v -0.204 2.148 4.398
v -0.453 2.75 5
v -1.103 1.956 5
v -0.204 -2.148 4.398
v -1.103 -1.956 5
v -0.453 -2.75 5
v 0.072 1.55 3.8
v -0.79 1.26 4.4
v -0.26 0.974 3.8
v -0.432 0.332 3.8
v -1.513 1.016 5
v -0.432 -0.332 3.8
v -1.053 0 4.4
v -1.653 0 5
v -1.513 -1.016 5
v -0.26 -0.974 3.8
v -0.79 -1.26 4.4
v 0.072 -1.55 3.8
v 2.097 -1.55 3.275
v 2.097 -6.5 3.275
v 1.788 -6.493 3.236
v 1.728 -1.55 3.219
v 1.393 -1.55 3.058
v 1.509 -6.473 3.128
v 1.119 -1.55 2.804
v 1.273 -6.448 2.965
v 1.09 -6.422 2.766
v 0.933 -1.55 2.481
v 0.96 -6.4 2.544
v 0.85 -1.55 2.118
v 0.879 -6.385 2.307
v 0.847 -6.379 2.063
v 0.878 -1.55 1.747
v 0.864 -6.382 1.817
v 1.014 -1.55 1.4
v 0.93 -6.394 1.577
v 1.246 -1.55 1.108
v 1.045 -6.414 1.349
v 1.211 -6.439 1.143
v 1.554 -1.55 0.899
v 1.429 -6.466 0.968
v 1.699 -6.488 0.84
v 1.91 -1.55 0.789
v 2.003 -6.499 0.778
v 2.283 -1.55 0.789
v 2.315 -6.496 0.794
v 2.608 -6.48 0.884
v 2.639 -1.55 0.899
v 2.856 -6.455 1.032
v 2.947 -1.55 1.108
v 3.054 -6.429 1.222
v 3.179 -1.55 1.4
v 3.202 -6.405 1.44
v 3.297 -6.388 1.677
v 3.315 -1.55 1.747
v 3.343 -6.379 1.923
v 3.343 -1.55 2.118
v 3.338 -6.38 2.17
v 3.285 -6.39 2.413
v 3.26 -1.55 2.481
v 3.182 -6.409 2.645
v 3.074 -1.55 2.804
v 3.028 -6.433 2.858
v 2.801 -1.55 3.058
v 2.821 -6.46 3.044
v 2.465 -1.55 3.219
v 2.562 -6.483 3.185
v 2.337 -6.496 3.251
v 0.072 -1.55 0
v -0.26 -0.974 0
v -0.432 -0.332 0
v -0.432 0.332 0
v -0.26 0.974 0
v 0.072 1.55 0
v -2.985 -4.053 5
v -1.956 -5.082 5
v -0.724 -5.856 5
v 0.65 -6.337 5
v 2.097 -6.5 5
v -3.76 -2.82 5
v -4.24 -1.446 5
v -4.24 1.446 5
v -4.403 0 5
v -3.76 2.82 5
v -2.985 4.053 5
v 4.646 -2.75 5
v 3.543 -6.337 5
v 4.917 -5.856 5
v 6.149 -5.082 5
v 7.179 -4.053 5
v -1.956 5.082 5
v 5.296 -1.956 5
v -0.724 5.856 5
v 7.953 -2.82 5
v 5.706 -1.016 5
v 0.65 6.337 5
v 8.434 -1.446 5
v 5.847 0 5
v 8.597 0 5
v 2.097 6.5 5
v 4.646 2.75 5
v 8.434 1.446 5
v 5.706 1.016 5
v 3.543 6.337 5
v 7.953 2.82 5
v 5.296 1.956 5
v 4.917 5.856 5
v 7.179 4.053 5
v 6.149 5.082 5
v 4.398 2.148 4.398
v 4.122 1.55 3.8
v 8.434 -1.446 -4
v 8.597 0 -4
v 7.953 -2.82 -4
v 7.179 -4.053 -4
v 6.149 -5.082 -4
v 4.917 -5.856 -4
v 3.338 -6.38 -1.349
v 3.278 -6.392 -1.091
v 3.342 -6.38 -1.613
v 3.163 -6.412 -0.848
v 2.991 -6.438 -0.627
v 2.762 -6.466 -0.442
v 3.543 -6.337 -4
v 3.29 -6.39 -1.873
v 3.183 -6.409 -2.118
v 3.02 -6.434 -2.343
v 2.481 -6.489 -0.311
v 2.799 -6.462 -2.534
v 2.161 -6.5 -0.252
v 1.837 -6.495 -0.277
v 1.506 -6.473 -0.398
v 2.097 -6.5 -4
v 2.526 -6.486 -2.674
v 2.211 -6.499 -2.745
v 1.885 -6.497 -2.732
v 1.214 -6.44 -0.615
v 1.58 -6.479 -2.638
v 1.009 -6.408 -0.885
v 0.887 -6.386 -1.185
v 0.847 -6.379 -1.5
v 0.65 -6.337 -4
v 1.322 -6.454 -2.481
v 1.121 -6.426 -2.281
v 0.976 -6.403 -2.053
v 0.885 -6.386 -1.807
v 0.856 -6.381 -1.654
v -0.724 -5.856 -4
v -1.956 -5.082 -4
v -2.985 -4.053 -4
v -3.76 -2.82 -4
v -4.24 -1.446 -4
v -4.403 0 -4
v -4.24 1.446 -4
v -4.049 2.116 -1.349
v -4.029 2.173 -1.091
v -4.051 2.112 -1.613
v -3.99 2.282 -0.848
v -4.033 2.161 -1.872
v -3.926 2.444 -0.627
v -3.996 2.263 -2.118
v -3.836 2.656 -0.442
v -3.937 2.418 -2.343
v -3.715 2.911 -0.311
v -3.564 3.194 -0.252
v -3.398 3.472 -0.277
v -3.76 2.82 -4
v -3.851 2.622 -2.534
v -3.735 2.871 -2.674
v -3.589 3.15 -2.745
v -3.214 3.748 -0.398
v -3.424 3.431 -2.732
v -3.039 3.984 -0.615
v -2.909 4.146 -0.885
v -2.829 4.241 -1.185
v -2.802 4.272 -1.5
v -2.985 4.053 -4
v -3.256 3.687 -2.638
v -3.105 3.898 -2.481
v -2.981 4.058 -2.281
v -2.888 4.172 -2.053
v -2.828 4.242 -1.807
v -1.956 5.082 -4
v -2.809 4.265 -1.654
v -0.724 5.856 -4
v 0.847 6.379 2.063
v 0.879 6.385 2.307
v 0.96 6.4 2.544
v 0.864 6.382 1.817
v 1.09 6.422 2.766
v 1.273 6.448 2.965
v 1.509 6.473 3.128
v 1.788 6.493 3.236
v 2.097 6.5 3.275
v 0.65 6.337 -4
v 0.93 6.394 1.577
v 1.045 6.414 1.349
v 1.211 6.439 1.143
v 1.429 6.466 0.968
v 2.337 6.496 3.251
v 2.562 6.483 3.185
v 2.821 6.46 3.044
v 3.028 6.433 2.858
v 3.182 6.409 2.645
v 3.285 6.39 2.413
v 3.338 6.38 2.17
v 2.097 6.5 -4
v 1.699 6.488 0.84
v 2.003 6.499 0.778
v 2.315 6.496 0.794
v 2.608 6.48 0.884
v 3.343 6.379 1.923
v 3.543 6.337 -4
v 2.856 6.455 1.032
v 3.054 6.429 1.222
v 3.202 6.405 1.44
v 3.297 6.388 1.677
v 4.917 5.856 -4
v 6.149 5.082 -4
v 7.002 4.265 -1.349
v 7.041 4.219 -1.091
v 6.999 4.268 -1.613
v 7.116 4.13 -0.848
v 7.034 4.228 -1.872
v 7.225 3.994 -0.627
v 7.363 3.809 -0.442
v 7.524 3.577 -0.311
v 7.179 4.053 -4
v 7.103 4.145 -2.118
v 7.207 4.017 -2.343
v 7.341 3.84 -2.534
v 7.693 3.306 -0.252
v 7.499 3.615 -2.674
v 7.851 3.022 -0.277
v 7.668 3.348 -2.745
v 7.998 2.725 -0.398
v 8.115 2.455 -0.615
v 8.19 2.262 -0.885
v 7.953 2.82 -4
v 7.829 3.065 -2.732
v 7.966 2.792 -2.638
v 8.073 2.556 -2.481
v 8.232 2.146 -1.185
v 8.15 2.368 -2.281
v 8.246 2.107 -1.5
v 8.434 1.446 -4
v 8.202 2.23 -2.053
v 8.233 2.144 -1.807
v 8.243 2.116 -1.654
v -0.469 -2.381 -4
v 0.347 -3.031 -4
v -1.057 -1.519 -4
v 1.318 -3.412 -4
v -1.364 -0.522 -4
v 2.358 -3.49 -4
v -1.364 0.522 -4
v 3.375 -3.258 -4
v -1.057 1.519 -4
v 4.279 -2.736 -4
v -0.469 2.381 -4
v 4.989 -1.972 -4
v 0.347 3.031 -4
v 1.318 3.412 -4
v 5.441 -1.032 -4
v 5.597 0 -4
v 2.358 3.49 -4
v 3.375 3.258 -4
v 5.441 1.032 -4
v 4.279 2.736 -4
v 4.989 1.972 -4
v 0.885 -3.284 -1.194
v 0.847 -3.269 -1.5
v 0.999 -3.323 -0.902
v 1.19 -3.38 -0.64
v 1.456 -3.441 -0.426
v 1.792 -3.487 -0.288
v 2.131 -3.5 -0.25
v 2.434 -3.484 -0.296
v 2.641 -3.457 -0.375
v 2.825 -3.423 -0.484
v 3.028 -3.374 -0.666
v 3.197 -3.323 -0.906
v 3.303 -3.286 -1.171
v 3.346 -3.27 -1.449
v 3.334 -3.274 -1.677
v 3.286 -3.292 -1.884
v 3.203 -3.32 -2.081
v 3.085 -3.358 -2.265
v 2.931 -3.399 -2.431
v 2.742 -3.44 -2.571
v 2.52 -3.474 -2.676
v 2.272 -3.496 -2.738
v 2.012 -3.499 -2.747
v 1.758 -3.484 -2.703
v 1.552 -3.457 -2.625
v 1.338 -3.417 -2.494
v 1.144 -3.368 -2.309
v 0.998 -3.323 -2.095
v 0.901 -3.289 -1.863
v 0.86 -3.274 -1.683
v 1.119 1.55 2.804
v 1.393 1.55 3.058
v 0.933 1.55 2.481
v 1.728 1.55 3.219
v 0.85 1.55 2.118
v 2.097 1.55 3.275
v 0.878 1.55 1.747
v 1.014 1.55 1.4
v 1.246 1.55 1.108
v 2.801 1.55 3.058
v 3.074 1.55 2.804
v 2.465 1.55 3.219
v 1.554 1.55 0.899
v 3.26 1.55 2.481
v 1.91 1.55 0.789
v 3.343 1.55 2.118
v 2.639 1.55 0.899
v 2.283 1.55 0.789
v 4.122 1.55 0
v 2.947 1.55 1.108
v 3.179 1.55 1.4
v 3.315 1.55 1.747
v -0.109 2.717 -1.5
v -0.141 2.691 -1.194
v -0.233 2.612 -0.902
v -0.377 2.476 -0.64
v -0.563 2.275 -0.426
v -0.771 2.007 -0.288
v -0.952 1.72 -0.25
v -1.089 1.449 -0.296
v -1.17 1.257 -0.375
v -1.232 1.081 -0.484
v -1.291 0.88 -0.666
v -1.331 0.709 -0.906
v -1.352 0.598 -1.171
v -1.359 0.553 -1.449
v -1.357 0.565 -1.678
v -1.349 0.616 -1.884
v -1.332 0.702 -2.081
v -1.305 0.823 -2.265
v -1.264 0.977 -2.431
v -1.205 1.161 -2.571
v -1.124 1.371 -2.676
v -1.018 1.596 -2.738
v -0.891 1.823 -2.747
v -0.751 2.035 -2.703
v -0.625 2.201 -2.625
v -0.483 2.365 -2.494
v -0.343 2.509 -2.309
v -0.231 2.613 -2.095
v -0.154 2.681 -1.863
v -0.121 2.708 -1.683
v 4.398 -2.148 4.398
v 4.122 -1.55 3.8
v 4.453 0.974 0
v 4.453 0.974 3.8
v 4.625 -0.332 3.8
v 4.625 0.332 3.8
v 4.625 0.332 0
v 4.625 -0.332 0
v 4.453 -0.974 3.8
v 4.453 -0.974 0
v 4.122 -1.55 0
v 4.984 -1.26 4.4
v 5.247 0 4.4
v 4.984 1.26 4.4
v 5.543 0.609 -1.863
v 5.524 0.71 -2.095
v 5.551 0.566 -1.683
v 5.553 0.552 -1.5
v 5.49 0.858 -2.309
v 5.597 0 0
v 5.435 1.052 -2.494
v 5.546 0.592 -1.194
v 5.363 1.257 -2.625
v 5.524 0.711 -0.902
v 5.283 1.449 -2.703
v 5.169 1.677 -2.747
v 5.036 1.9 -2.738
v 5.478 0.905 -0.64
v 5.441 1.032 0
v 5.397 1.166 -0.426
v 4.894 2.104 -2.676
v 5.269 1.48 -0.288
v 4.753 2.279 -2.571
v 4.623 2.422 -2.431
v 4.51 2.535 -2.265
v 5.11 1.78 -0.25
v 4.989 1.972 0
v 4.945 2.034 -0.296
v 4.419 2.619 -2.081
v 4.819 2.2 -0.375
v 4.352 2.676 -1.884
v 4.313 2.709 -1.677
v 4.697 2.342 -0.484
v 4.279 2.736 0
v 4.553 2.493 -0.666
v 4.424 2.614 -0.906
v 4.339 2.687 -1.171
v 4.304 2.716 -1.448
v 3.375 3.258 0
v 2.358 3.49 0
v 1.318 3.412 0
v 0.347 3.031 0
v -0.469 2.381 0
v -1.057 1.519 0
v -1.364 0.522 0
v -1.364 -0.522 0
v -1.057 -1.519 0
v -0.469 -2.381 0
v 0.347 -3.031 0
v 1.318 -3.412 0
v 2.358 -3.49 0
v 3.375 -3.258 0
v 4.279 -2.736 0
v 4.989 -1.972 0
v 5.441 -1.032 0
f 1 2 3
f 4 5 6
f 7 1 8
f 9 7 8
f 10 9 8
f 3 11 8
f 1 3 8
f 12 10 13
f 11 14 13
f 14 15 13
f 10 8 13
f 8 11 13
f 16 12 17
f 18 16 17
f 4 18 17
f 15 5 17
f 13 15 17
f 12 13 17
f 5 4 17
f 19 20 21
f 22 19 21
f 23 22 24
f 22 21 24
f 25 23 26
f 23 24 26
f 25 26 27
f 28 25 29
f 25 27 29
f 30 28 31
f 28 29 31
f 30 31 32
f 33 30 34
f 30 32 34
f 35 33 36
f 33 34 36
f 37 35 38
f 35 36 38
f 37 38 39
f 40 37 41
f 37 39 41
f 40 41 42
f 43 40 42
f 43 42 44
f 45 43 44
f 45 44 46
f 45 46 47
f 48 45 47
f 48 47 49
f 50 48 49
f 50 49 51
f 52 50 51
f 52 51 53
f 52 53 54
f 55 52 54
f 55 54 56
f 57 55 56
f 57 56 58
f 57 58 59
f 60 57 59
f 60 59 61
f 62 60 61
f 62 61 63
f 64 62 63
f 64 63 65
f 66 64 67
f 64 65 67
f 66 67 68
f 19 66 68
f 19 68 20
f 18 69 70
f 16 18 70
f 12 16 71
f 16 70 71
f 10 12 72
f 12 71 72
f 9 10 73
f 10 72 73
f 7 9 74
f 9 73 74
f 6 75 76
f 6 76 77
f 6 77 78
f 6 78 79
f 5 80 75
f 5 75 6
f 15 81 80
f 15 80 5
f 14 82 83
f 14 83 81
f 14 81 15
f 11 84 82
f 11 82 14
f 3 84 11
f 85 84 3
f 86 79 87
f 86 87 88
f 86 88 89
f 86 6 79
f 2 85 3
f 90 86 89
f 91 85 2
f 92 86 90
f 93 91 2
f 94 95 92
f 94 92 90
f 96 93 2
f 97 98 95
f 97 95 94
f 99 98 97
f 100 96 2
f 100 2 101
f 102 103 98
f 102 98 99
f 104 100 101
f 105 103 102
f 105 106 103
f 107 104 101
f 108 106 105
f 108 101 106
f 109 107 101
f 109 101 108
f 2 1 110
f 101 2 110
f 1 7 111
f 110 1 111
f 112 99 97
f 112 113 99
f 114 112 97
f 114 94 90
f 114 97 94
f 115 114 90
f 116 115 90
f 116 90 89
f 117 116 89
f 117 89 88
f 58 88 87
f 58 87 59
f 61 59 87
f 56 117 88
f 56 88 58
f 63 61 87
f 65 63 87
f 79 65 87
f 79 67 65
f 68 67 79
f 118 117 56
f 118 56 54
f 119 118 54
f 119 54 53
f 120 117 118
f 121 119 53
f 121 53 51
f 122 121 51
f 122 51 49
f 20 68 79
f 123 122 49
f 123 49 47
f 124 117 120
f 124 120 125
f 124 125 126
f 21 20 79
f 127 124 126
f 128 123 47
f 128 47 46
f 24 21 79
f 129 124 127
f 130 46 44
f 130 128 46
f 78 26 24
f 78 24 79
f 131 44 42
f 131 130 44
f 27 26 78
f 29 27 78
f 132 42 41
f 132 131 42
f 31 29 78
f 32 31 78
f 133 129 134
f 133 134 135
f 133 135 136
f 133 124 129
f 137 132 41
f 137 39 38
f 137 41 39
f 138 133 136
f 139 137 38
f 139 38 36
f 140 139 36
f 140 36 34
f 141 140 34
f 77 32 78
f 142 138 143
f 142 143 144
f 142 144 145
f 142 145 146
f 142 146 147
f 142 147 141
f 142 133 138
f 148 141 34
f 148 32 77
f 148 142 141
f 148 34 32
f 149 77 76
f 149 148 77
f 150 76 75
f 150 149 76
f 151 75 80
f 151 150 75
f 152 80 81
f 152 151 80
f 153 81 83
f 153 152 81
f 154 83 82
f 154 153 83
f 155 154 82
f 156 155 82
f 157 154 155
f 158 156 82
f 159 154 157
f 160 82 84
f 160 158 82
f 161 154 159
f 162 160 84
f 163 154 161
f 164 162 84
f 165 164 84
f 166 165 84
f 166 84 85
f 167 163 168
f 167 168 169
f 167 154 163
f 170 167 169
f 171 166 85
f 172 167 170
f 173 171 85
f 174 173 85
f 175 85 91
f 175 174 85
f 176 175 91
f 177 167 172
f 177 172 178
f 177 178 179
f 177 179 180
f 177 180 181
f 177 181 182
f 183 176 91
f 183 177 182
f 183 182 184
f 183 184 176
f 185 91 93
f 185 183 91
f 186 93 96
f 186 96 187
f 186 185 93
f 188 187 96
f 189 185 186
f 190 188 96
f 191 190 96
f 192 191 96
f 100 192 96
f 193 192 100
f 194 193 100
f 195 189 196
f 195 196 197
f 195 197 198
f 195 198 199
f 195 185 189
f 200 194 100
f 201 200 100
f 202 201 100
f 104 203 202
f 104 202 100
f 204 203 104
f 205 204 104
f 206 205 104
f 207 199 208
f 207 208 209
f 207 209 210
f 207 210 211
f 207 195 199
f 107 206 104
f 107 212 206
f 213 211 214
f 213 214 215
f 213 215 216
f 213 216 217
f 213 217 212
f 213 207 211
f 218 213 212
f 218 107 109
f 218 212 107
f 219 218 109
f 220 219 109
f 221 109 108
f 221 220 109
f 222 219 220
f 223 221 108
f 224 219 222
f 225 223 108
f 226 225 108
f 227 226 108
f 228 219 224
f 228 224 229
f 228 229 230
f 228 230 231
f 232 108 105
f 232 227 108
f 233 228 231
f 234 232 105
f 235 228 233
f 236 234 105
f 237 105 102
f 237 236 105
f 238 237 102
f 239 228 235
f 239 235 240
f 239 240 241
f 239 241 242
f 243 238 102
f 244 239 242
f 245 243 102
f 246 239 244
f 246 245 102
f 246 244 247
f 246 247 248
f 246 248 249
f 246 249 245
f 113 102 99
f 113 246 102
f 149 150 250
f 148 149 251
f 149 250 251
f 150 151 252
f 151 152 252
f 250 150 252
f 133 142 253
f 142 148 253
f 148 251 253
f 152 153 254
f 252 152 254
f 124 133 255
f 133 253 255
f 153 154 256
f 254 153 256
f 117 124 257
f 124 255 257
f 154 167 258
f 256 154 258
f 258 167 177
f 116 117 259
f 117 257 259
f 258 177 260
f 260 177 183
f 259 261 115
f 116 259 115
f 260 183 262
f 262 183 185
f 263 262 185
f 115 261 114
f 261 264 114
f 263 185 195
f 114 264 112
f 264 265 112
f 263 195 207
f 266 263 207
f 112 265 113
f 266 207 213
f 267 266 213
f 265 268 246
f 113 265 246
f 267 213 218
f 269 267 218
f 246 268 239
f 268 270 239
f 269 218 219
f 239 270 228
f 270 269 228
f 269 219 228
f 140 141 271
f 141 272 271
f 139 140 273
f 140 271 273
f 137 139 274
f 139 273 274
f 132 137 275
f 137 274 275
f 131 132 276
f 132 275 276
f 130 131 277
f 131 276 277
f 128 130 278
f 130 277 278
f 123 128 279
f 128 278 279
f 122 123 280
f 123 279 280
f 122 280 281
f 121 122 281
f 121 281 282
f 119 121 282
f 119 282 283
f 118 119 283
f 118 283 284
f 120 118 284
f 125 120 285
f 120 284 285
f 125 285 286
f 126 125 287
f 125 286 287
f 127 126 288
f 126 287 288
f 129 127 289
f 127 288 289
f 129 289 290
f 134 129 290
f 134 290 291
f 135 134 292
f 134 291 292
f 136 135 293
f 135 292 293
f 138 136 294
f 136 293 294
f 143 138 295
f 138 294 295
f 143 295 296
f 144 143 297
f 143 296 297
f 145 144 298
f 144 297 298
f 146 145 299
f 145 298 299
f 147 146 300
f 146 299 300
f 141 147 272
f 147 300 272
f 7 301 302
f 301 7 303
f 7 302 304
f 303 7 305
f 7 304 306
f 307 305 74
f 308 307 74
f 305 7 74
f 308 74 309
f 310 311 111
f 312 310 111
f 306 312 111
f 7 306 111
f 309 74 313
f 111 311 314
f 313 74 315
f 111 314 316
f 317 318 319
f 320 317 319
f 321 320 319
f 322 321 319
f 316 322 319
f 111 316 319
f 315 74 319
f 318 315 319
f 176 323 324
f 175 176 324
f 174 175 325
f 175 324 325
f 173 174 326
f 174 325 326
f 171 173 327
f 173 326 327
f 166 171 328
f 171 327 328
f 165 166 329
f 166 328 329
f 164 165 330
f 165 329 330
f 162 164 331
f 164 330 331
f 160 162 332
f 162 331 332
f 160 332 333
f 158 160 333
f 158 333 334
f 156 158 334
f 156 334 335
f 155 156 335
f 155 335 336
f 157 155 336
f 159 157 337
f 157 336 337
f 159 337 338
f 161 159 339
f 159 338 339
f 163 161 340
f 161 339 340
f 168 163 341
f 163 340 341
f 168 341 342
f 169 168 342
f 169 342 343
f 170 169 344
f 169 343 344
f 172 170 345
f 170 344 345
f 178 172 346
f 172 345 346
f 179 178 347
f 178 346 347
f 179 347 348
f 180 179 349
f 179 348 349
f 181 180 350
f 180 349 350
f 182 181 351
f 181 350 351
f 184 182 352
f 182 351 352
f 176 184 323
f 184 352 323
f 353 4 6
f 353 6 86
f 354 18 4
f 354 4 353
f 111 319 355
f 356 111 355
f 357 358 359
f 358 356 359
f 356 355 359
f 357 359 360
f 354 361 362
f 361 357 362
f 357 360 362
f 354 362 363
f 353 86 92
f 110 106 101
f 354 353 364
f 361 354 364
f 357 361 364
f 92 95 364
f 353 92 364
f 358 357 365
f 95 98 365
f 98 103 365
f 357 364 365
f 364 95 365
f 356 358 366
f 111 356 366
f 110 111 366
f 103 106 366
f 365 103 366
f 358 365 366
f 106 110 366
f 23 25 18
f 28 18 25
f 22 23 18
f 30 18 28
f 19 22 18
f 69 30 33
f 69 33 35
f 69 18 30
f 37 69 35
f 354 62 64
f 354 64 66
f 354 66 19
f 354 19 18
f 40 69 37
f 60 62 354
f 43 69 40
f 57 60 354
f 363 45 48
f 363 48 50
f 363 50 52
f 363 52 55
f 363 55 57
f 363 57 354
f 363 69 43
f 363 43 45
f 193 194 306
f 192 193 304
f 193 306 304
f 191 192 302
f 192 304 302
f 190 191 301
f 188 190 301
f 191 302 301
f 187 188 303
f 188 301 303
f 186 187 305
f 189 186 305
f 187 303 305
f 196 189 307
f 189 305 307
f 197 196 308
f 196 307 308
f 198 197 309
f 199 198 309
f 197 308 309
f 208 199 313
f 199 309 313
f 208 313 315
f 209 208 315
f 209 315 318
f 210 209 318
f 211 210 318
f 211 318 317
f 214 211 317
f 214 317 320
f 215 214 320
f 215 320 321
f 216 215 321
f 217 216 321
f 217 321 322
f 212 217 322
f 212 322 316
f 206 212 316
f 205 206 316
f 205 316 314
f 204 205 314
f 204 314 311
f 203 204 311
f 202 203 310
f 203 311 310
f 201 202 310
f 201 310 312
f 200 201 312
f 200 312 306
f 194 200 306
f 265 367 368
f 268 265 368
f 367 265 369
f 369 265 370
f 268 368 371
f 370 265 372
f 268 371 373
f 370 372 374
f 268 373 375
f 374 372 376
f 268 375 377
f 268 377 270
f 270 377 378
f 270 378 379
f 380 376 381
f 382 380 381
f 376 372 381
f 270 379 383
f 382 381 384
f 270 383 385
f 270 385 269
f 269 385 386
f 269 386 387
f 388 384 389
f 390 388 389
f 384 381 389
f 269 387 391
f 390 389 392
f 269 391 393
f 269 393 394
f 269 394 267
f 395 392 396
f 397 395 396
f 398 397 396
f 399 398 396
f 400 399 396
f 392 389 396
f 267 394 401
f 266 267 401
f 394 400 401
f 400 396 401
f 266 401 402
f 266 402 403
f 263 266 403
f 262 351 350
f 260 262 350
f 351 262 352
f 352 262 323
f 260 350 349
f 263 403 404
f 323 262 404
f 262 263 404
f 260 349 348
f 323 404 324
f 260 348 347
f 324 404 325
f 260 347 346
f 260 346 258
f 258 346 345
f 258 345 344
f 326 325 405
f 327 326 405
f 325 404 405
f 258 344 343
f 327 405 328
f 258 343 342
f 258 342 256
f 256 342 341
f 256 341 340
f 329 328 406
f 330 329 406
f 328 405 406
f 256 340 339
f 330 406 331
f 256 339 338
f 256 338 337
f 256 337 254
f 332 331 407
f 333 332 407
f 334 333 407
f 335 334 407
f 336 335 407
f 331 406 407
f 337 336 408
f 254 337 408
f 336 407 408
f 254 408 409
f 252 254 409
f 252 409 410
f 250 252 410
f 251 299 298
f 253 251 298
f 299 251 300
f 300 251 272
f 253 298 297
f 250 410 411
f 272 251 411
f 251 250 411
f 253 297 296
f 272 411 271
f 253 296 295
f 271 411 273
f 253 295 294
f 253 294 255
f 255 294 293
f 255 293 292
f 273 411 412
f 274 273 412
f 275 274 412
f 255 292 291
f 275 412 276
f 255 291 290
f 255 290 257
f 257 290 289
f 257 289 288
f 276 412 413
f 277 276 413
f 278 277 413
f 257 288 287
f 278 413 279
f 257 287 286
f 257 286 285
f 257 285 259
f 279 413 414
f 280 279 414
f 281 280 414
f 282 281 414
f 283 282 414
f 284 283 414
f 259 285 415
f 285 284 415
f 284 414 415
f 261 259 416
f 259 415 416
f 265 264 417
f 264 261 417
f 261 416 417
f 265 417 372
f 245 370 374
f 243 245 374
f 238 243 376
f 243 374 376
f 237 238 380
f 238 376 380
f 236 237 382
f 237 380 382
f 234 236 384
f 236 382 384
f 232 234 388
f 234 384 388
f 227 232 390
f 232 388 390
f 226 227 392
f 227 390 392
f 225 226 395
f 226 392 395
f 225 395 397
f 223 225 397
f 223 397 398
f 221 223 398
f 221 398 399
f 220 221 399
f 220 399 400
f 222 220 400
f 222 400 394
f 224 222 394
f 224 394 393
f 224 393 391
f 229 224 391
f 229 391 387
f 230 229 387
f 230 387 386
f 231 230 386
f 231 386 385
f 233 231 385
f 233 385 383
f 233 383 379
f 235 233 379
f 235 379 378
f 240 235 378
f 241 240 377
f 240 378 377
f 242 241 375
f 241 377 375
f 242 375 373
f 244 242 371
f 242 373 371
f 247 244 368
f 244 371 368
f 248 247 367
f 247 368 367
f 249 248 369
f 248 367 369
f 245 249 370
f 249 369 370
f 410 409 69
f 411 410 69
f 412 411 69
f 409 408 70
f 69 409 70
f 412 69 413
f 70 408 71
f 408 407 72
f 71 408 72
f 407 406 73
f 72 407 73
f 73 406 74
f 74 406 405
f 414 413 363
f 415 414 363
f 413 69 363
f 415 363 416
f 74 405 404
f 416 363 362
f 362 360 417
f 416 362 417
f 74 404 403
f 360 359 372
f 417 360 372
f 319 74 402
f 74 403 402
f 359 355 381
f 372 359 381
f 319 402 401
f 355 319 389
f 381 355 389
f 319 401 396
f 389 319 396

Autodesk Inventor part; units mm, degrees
ref_plane "YZ Plane" through (0, 0, 0) normal (1, 0, 0) x (0, 1, 0)
ref_plane "XZ Plane" through (0, 0, 0) normal (0, 1, 0) x (-1, 0, 0)
sketch "Sketch1" plane through (0, 0, 0) normal (0, 0, 1) x (1, 0, 0)
  line L0 (0.8467, -0.7217) -> (0.8467, 0.7217) construction
  line L1 (0.8467, 0.7217) -> (2.0967, 1.4434) construction
  line L2 (2.0967, 1.4434) -> (3.3467, 0.7217) construction
  line L3 (3.3467, 0.7217) -> (3.3467, -0.7217) construction
  line L4 (3.3467, -0.7217) -> (2.0967, -1.4434) construction
  line L5 (2.0967, -1.4434) -> (0.8467, -0.7217) construction
  circle A0 centre (2.0967, 0) radius 2.45 construction
  line L6 (4.8467, -1.5877) -> (3.4717, -2.3816) construction
  line L7 (15.0967, 3) -> (15.0967, -3) construction
  line L8 (-10.9033, 3) -> (-10.9033, -3) construction
  line L9 (-0.6533, 0) -> (-0.6533, 1.5877) construction
  circle A1 centre (2.0967, 0) radius 5
  circle A2 centre (2.0967, 0) radius 1.7 projected
  line L10 (-10.9033, -3) -> (15.0967, -3) projected
  line L11 (-10.9033, 3) -> (15.0967, 3) projected
  circle A3 centre (2.0967, 0) radius 3.5
  circle A4 centre (2.0967, 0) radius 6.5
  point P0 (0.4719, -0.5)
  point P1 (3.7215, -0.5)
  dimension "d10" = 7
  dimension "d13" = 13
ref_plane "Work Plane1" through (-20.8033, -6.3, -5.9) normal (0, 0, 1) x (1, 0, 0)
extrude "Extrusion1" add sketch "Sketch1" against normal blind 4 contours A1 L10 A3 L11 | A1 L11 A4 L10 | L11 A3 A1 | A1 L11 A4 | L10 A4 A1 | A1 L10 A3 | L11 A3 L10 A1 | A1 L10 A4 L11
sketch "Sketch2" plane through (2.0967, 0, 0) normal (0, 0, 1) x (1, 0, 0)
  line L0 (-2, 1.5) -> (2, 1.5) construction
  arc A0 (2.5, 0) -> (2, 1.5) centre (0, 0) ccw construction
  arc A1 (-2, 1.5) -> (-2.5, 0) centre (0, 0) ccw construction
  line L1 (2, -1.5) -> (-2, -1.5) construction
  arc A2 (-2.5, 0) -> (2.5, 0) centre (0, 0) ccw construction
  line L2 (2.0248, 1.55) -> (-2.0248, 1.55) construction
  arc A3 (-2.0248, 1.55) -> (-2.55, 0) centre (0, 0) ccw construction
  arc A4 (-2.55, 0) -> (2.55, 0) centre (0, 0) ccw construction
  arc A5 (2.55, 0) -> (2.0248, 1.55) centre (0, 0) ccw construction
  line L3 (-2.0248, 1.55) -> (2.0248, 1.55) construction
  line L4 (-2.0248, 1.55) -> (2.0248, 1.55)
  line L5 (-2.0248, -1.55) -> (2.0248, -1.55)
  arc A6 (-2.0248, 1.55) -> (-2.0248, -1.55) centre (0, 0) ccw
  arc A7 (2.0248, -1.55) -> (2.0248, 1.55) centre (0, 0) ccw
  circle A8 centre (0, 0) radius 6.5 projected
  point P0 (-2.0967, 0)
  dimension "d11" = 3.1
  dimension "d12" = 2.55
extrude "Extrusion2" add sketch "Sketch2" along normal blind 5
chamfer "Chamfer1" distance 1.2 angle 45 4 edges at (2.0967, 1.55, 5) (-0.4533, 0, 5) (2.0967, -1.55, 5) (4.6467, 0, 5)
sketch "Sketch3" plane through (0, 0, 0) normal (0, 1, 0) x (-1, 0, 0)
  line L0 (-4.6467, 0) -> (-4.6467, 3.8) projected
  line L1 (0.4533, 0) -> (0.4533, 3.8) projected
  line L2 (-8.5967, -4) -> (4.4033, -4) projected
  circle A0 centre (-2.0967, -1.5) radius 1.25
  line L3 (-8.5967, -4) -> (4.4033, -4) projected
  point P0 (0, 0)
  point P1 (-8.5967, 0)
  point P2 (4.4033, 0)
  dimension "d14" = 2.5
  dimension "d15" = 2.5
extrude "Extrusion3" cut sketch "Sketch3" against normal blind 10
pattern_circular "Circular Pattern1" count 3 over 360 about axis through (2.0967, 0, 0) along (0, 0, -1) of "Extrusion3"
sketch "Sketch4" plane through (0.0718, -1.55, 0) normal (0, 1, 0) x (1, 0, 0)
  line L0 (0, -3.8) -> (4.0497, -3.8) projected
  line L1 (-4.4752, -5) -> (8.5248, -5) projected
  line L2 (8.5248, 4) -> (-4.4752, 4) projected
  line L3 (4.0497, -3.8) -> (0, -3.8) projected
  line L4 (4.0497, 0) -> (4.0497, -3.8) projected
  line L5 (0, 0) -> (4.0497, 0) projected
  line L6 (0, 0) -> (0, -3.8) projected
  circle A0 centre (2.0248, -2.0248) radius 2.0248
  point P0 (-0.0718, 0)
  point P1 (8.1739, 1.5)
  point P2 (-2.8742, 1.5)
  point P3 (0.7748, 1.5)
hole "Hole1" at (2.0967, -1.55, 2.0248) direction (0, -1, 0) diameter 2.5 end through all both
properties part number "01_28BYJ_Coupling_ScrewM4"
